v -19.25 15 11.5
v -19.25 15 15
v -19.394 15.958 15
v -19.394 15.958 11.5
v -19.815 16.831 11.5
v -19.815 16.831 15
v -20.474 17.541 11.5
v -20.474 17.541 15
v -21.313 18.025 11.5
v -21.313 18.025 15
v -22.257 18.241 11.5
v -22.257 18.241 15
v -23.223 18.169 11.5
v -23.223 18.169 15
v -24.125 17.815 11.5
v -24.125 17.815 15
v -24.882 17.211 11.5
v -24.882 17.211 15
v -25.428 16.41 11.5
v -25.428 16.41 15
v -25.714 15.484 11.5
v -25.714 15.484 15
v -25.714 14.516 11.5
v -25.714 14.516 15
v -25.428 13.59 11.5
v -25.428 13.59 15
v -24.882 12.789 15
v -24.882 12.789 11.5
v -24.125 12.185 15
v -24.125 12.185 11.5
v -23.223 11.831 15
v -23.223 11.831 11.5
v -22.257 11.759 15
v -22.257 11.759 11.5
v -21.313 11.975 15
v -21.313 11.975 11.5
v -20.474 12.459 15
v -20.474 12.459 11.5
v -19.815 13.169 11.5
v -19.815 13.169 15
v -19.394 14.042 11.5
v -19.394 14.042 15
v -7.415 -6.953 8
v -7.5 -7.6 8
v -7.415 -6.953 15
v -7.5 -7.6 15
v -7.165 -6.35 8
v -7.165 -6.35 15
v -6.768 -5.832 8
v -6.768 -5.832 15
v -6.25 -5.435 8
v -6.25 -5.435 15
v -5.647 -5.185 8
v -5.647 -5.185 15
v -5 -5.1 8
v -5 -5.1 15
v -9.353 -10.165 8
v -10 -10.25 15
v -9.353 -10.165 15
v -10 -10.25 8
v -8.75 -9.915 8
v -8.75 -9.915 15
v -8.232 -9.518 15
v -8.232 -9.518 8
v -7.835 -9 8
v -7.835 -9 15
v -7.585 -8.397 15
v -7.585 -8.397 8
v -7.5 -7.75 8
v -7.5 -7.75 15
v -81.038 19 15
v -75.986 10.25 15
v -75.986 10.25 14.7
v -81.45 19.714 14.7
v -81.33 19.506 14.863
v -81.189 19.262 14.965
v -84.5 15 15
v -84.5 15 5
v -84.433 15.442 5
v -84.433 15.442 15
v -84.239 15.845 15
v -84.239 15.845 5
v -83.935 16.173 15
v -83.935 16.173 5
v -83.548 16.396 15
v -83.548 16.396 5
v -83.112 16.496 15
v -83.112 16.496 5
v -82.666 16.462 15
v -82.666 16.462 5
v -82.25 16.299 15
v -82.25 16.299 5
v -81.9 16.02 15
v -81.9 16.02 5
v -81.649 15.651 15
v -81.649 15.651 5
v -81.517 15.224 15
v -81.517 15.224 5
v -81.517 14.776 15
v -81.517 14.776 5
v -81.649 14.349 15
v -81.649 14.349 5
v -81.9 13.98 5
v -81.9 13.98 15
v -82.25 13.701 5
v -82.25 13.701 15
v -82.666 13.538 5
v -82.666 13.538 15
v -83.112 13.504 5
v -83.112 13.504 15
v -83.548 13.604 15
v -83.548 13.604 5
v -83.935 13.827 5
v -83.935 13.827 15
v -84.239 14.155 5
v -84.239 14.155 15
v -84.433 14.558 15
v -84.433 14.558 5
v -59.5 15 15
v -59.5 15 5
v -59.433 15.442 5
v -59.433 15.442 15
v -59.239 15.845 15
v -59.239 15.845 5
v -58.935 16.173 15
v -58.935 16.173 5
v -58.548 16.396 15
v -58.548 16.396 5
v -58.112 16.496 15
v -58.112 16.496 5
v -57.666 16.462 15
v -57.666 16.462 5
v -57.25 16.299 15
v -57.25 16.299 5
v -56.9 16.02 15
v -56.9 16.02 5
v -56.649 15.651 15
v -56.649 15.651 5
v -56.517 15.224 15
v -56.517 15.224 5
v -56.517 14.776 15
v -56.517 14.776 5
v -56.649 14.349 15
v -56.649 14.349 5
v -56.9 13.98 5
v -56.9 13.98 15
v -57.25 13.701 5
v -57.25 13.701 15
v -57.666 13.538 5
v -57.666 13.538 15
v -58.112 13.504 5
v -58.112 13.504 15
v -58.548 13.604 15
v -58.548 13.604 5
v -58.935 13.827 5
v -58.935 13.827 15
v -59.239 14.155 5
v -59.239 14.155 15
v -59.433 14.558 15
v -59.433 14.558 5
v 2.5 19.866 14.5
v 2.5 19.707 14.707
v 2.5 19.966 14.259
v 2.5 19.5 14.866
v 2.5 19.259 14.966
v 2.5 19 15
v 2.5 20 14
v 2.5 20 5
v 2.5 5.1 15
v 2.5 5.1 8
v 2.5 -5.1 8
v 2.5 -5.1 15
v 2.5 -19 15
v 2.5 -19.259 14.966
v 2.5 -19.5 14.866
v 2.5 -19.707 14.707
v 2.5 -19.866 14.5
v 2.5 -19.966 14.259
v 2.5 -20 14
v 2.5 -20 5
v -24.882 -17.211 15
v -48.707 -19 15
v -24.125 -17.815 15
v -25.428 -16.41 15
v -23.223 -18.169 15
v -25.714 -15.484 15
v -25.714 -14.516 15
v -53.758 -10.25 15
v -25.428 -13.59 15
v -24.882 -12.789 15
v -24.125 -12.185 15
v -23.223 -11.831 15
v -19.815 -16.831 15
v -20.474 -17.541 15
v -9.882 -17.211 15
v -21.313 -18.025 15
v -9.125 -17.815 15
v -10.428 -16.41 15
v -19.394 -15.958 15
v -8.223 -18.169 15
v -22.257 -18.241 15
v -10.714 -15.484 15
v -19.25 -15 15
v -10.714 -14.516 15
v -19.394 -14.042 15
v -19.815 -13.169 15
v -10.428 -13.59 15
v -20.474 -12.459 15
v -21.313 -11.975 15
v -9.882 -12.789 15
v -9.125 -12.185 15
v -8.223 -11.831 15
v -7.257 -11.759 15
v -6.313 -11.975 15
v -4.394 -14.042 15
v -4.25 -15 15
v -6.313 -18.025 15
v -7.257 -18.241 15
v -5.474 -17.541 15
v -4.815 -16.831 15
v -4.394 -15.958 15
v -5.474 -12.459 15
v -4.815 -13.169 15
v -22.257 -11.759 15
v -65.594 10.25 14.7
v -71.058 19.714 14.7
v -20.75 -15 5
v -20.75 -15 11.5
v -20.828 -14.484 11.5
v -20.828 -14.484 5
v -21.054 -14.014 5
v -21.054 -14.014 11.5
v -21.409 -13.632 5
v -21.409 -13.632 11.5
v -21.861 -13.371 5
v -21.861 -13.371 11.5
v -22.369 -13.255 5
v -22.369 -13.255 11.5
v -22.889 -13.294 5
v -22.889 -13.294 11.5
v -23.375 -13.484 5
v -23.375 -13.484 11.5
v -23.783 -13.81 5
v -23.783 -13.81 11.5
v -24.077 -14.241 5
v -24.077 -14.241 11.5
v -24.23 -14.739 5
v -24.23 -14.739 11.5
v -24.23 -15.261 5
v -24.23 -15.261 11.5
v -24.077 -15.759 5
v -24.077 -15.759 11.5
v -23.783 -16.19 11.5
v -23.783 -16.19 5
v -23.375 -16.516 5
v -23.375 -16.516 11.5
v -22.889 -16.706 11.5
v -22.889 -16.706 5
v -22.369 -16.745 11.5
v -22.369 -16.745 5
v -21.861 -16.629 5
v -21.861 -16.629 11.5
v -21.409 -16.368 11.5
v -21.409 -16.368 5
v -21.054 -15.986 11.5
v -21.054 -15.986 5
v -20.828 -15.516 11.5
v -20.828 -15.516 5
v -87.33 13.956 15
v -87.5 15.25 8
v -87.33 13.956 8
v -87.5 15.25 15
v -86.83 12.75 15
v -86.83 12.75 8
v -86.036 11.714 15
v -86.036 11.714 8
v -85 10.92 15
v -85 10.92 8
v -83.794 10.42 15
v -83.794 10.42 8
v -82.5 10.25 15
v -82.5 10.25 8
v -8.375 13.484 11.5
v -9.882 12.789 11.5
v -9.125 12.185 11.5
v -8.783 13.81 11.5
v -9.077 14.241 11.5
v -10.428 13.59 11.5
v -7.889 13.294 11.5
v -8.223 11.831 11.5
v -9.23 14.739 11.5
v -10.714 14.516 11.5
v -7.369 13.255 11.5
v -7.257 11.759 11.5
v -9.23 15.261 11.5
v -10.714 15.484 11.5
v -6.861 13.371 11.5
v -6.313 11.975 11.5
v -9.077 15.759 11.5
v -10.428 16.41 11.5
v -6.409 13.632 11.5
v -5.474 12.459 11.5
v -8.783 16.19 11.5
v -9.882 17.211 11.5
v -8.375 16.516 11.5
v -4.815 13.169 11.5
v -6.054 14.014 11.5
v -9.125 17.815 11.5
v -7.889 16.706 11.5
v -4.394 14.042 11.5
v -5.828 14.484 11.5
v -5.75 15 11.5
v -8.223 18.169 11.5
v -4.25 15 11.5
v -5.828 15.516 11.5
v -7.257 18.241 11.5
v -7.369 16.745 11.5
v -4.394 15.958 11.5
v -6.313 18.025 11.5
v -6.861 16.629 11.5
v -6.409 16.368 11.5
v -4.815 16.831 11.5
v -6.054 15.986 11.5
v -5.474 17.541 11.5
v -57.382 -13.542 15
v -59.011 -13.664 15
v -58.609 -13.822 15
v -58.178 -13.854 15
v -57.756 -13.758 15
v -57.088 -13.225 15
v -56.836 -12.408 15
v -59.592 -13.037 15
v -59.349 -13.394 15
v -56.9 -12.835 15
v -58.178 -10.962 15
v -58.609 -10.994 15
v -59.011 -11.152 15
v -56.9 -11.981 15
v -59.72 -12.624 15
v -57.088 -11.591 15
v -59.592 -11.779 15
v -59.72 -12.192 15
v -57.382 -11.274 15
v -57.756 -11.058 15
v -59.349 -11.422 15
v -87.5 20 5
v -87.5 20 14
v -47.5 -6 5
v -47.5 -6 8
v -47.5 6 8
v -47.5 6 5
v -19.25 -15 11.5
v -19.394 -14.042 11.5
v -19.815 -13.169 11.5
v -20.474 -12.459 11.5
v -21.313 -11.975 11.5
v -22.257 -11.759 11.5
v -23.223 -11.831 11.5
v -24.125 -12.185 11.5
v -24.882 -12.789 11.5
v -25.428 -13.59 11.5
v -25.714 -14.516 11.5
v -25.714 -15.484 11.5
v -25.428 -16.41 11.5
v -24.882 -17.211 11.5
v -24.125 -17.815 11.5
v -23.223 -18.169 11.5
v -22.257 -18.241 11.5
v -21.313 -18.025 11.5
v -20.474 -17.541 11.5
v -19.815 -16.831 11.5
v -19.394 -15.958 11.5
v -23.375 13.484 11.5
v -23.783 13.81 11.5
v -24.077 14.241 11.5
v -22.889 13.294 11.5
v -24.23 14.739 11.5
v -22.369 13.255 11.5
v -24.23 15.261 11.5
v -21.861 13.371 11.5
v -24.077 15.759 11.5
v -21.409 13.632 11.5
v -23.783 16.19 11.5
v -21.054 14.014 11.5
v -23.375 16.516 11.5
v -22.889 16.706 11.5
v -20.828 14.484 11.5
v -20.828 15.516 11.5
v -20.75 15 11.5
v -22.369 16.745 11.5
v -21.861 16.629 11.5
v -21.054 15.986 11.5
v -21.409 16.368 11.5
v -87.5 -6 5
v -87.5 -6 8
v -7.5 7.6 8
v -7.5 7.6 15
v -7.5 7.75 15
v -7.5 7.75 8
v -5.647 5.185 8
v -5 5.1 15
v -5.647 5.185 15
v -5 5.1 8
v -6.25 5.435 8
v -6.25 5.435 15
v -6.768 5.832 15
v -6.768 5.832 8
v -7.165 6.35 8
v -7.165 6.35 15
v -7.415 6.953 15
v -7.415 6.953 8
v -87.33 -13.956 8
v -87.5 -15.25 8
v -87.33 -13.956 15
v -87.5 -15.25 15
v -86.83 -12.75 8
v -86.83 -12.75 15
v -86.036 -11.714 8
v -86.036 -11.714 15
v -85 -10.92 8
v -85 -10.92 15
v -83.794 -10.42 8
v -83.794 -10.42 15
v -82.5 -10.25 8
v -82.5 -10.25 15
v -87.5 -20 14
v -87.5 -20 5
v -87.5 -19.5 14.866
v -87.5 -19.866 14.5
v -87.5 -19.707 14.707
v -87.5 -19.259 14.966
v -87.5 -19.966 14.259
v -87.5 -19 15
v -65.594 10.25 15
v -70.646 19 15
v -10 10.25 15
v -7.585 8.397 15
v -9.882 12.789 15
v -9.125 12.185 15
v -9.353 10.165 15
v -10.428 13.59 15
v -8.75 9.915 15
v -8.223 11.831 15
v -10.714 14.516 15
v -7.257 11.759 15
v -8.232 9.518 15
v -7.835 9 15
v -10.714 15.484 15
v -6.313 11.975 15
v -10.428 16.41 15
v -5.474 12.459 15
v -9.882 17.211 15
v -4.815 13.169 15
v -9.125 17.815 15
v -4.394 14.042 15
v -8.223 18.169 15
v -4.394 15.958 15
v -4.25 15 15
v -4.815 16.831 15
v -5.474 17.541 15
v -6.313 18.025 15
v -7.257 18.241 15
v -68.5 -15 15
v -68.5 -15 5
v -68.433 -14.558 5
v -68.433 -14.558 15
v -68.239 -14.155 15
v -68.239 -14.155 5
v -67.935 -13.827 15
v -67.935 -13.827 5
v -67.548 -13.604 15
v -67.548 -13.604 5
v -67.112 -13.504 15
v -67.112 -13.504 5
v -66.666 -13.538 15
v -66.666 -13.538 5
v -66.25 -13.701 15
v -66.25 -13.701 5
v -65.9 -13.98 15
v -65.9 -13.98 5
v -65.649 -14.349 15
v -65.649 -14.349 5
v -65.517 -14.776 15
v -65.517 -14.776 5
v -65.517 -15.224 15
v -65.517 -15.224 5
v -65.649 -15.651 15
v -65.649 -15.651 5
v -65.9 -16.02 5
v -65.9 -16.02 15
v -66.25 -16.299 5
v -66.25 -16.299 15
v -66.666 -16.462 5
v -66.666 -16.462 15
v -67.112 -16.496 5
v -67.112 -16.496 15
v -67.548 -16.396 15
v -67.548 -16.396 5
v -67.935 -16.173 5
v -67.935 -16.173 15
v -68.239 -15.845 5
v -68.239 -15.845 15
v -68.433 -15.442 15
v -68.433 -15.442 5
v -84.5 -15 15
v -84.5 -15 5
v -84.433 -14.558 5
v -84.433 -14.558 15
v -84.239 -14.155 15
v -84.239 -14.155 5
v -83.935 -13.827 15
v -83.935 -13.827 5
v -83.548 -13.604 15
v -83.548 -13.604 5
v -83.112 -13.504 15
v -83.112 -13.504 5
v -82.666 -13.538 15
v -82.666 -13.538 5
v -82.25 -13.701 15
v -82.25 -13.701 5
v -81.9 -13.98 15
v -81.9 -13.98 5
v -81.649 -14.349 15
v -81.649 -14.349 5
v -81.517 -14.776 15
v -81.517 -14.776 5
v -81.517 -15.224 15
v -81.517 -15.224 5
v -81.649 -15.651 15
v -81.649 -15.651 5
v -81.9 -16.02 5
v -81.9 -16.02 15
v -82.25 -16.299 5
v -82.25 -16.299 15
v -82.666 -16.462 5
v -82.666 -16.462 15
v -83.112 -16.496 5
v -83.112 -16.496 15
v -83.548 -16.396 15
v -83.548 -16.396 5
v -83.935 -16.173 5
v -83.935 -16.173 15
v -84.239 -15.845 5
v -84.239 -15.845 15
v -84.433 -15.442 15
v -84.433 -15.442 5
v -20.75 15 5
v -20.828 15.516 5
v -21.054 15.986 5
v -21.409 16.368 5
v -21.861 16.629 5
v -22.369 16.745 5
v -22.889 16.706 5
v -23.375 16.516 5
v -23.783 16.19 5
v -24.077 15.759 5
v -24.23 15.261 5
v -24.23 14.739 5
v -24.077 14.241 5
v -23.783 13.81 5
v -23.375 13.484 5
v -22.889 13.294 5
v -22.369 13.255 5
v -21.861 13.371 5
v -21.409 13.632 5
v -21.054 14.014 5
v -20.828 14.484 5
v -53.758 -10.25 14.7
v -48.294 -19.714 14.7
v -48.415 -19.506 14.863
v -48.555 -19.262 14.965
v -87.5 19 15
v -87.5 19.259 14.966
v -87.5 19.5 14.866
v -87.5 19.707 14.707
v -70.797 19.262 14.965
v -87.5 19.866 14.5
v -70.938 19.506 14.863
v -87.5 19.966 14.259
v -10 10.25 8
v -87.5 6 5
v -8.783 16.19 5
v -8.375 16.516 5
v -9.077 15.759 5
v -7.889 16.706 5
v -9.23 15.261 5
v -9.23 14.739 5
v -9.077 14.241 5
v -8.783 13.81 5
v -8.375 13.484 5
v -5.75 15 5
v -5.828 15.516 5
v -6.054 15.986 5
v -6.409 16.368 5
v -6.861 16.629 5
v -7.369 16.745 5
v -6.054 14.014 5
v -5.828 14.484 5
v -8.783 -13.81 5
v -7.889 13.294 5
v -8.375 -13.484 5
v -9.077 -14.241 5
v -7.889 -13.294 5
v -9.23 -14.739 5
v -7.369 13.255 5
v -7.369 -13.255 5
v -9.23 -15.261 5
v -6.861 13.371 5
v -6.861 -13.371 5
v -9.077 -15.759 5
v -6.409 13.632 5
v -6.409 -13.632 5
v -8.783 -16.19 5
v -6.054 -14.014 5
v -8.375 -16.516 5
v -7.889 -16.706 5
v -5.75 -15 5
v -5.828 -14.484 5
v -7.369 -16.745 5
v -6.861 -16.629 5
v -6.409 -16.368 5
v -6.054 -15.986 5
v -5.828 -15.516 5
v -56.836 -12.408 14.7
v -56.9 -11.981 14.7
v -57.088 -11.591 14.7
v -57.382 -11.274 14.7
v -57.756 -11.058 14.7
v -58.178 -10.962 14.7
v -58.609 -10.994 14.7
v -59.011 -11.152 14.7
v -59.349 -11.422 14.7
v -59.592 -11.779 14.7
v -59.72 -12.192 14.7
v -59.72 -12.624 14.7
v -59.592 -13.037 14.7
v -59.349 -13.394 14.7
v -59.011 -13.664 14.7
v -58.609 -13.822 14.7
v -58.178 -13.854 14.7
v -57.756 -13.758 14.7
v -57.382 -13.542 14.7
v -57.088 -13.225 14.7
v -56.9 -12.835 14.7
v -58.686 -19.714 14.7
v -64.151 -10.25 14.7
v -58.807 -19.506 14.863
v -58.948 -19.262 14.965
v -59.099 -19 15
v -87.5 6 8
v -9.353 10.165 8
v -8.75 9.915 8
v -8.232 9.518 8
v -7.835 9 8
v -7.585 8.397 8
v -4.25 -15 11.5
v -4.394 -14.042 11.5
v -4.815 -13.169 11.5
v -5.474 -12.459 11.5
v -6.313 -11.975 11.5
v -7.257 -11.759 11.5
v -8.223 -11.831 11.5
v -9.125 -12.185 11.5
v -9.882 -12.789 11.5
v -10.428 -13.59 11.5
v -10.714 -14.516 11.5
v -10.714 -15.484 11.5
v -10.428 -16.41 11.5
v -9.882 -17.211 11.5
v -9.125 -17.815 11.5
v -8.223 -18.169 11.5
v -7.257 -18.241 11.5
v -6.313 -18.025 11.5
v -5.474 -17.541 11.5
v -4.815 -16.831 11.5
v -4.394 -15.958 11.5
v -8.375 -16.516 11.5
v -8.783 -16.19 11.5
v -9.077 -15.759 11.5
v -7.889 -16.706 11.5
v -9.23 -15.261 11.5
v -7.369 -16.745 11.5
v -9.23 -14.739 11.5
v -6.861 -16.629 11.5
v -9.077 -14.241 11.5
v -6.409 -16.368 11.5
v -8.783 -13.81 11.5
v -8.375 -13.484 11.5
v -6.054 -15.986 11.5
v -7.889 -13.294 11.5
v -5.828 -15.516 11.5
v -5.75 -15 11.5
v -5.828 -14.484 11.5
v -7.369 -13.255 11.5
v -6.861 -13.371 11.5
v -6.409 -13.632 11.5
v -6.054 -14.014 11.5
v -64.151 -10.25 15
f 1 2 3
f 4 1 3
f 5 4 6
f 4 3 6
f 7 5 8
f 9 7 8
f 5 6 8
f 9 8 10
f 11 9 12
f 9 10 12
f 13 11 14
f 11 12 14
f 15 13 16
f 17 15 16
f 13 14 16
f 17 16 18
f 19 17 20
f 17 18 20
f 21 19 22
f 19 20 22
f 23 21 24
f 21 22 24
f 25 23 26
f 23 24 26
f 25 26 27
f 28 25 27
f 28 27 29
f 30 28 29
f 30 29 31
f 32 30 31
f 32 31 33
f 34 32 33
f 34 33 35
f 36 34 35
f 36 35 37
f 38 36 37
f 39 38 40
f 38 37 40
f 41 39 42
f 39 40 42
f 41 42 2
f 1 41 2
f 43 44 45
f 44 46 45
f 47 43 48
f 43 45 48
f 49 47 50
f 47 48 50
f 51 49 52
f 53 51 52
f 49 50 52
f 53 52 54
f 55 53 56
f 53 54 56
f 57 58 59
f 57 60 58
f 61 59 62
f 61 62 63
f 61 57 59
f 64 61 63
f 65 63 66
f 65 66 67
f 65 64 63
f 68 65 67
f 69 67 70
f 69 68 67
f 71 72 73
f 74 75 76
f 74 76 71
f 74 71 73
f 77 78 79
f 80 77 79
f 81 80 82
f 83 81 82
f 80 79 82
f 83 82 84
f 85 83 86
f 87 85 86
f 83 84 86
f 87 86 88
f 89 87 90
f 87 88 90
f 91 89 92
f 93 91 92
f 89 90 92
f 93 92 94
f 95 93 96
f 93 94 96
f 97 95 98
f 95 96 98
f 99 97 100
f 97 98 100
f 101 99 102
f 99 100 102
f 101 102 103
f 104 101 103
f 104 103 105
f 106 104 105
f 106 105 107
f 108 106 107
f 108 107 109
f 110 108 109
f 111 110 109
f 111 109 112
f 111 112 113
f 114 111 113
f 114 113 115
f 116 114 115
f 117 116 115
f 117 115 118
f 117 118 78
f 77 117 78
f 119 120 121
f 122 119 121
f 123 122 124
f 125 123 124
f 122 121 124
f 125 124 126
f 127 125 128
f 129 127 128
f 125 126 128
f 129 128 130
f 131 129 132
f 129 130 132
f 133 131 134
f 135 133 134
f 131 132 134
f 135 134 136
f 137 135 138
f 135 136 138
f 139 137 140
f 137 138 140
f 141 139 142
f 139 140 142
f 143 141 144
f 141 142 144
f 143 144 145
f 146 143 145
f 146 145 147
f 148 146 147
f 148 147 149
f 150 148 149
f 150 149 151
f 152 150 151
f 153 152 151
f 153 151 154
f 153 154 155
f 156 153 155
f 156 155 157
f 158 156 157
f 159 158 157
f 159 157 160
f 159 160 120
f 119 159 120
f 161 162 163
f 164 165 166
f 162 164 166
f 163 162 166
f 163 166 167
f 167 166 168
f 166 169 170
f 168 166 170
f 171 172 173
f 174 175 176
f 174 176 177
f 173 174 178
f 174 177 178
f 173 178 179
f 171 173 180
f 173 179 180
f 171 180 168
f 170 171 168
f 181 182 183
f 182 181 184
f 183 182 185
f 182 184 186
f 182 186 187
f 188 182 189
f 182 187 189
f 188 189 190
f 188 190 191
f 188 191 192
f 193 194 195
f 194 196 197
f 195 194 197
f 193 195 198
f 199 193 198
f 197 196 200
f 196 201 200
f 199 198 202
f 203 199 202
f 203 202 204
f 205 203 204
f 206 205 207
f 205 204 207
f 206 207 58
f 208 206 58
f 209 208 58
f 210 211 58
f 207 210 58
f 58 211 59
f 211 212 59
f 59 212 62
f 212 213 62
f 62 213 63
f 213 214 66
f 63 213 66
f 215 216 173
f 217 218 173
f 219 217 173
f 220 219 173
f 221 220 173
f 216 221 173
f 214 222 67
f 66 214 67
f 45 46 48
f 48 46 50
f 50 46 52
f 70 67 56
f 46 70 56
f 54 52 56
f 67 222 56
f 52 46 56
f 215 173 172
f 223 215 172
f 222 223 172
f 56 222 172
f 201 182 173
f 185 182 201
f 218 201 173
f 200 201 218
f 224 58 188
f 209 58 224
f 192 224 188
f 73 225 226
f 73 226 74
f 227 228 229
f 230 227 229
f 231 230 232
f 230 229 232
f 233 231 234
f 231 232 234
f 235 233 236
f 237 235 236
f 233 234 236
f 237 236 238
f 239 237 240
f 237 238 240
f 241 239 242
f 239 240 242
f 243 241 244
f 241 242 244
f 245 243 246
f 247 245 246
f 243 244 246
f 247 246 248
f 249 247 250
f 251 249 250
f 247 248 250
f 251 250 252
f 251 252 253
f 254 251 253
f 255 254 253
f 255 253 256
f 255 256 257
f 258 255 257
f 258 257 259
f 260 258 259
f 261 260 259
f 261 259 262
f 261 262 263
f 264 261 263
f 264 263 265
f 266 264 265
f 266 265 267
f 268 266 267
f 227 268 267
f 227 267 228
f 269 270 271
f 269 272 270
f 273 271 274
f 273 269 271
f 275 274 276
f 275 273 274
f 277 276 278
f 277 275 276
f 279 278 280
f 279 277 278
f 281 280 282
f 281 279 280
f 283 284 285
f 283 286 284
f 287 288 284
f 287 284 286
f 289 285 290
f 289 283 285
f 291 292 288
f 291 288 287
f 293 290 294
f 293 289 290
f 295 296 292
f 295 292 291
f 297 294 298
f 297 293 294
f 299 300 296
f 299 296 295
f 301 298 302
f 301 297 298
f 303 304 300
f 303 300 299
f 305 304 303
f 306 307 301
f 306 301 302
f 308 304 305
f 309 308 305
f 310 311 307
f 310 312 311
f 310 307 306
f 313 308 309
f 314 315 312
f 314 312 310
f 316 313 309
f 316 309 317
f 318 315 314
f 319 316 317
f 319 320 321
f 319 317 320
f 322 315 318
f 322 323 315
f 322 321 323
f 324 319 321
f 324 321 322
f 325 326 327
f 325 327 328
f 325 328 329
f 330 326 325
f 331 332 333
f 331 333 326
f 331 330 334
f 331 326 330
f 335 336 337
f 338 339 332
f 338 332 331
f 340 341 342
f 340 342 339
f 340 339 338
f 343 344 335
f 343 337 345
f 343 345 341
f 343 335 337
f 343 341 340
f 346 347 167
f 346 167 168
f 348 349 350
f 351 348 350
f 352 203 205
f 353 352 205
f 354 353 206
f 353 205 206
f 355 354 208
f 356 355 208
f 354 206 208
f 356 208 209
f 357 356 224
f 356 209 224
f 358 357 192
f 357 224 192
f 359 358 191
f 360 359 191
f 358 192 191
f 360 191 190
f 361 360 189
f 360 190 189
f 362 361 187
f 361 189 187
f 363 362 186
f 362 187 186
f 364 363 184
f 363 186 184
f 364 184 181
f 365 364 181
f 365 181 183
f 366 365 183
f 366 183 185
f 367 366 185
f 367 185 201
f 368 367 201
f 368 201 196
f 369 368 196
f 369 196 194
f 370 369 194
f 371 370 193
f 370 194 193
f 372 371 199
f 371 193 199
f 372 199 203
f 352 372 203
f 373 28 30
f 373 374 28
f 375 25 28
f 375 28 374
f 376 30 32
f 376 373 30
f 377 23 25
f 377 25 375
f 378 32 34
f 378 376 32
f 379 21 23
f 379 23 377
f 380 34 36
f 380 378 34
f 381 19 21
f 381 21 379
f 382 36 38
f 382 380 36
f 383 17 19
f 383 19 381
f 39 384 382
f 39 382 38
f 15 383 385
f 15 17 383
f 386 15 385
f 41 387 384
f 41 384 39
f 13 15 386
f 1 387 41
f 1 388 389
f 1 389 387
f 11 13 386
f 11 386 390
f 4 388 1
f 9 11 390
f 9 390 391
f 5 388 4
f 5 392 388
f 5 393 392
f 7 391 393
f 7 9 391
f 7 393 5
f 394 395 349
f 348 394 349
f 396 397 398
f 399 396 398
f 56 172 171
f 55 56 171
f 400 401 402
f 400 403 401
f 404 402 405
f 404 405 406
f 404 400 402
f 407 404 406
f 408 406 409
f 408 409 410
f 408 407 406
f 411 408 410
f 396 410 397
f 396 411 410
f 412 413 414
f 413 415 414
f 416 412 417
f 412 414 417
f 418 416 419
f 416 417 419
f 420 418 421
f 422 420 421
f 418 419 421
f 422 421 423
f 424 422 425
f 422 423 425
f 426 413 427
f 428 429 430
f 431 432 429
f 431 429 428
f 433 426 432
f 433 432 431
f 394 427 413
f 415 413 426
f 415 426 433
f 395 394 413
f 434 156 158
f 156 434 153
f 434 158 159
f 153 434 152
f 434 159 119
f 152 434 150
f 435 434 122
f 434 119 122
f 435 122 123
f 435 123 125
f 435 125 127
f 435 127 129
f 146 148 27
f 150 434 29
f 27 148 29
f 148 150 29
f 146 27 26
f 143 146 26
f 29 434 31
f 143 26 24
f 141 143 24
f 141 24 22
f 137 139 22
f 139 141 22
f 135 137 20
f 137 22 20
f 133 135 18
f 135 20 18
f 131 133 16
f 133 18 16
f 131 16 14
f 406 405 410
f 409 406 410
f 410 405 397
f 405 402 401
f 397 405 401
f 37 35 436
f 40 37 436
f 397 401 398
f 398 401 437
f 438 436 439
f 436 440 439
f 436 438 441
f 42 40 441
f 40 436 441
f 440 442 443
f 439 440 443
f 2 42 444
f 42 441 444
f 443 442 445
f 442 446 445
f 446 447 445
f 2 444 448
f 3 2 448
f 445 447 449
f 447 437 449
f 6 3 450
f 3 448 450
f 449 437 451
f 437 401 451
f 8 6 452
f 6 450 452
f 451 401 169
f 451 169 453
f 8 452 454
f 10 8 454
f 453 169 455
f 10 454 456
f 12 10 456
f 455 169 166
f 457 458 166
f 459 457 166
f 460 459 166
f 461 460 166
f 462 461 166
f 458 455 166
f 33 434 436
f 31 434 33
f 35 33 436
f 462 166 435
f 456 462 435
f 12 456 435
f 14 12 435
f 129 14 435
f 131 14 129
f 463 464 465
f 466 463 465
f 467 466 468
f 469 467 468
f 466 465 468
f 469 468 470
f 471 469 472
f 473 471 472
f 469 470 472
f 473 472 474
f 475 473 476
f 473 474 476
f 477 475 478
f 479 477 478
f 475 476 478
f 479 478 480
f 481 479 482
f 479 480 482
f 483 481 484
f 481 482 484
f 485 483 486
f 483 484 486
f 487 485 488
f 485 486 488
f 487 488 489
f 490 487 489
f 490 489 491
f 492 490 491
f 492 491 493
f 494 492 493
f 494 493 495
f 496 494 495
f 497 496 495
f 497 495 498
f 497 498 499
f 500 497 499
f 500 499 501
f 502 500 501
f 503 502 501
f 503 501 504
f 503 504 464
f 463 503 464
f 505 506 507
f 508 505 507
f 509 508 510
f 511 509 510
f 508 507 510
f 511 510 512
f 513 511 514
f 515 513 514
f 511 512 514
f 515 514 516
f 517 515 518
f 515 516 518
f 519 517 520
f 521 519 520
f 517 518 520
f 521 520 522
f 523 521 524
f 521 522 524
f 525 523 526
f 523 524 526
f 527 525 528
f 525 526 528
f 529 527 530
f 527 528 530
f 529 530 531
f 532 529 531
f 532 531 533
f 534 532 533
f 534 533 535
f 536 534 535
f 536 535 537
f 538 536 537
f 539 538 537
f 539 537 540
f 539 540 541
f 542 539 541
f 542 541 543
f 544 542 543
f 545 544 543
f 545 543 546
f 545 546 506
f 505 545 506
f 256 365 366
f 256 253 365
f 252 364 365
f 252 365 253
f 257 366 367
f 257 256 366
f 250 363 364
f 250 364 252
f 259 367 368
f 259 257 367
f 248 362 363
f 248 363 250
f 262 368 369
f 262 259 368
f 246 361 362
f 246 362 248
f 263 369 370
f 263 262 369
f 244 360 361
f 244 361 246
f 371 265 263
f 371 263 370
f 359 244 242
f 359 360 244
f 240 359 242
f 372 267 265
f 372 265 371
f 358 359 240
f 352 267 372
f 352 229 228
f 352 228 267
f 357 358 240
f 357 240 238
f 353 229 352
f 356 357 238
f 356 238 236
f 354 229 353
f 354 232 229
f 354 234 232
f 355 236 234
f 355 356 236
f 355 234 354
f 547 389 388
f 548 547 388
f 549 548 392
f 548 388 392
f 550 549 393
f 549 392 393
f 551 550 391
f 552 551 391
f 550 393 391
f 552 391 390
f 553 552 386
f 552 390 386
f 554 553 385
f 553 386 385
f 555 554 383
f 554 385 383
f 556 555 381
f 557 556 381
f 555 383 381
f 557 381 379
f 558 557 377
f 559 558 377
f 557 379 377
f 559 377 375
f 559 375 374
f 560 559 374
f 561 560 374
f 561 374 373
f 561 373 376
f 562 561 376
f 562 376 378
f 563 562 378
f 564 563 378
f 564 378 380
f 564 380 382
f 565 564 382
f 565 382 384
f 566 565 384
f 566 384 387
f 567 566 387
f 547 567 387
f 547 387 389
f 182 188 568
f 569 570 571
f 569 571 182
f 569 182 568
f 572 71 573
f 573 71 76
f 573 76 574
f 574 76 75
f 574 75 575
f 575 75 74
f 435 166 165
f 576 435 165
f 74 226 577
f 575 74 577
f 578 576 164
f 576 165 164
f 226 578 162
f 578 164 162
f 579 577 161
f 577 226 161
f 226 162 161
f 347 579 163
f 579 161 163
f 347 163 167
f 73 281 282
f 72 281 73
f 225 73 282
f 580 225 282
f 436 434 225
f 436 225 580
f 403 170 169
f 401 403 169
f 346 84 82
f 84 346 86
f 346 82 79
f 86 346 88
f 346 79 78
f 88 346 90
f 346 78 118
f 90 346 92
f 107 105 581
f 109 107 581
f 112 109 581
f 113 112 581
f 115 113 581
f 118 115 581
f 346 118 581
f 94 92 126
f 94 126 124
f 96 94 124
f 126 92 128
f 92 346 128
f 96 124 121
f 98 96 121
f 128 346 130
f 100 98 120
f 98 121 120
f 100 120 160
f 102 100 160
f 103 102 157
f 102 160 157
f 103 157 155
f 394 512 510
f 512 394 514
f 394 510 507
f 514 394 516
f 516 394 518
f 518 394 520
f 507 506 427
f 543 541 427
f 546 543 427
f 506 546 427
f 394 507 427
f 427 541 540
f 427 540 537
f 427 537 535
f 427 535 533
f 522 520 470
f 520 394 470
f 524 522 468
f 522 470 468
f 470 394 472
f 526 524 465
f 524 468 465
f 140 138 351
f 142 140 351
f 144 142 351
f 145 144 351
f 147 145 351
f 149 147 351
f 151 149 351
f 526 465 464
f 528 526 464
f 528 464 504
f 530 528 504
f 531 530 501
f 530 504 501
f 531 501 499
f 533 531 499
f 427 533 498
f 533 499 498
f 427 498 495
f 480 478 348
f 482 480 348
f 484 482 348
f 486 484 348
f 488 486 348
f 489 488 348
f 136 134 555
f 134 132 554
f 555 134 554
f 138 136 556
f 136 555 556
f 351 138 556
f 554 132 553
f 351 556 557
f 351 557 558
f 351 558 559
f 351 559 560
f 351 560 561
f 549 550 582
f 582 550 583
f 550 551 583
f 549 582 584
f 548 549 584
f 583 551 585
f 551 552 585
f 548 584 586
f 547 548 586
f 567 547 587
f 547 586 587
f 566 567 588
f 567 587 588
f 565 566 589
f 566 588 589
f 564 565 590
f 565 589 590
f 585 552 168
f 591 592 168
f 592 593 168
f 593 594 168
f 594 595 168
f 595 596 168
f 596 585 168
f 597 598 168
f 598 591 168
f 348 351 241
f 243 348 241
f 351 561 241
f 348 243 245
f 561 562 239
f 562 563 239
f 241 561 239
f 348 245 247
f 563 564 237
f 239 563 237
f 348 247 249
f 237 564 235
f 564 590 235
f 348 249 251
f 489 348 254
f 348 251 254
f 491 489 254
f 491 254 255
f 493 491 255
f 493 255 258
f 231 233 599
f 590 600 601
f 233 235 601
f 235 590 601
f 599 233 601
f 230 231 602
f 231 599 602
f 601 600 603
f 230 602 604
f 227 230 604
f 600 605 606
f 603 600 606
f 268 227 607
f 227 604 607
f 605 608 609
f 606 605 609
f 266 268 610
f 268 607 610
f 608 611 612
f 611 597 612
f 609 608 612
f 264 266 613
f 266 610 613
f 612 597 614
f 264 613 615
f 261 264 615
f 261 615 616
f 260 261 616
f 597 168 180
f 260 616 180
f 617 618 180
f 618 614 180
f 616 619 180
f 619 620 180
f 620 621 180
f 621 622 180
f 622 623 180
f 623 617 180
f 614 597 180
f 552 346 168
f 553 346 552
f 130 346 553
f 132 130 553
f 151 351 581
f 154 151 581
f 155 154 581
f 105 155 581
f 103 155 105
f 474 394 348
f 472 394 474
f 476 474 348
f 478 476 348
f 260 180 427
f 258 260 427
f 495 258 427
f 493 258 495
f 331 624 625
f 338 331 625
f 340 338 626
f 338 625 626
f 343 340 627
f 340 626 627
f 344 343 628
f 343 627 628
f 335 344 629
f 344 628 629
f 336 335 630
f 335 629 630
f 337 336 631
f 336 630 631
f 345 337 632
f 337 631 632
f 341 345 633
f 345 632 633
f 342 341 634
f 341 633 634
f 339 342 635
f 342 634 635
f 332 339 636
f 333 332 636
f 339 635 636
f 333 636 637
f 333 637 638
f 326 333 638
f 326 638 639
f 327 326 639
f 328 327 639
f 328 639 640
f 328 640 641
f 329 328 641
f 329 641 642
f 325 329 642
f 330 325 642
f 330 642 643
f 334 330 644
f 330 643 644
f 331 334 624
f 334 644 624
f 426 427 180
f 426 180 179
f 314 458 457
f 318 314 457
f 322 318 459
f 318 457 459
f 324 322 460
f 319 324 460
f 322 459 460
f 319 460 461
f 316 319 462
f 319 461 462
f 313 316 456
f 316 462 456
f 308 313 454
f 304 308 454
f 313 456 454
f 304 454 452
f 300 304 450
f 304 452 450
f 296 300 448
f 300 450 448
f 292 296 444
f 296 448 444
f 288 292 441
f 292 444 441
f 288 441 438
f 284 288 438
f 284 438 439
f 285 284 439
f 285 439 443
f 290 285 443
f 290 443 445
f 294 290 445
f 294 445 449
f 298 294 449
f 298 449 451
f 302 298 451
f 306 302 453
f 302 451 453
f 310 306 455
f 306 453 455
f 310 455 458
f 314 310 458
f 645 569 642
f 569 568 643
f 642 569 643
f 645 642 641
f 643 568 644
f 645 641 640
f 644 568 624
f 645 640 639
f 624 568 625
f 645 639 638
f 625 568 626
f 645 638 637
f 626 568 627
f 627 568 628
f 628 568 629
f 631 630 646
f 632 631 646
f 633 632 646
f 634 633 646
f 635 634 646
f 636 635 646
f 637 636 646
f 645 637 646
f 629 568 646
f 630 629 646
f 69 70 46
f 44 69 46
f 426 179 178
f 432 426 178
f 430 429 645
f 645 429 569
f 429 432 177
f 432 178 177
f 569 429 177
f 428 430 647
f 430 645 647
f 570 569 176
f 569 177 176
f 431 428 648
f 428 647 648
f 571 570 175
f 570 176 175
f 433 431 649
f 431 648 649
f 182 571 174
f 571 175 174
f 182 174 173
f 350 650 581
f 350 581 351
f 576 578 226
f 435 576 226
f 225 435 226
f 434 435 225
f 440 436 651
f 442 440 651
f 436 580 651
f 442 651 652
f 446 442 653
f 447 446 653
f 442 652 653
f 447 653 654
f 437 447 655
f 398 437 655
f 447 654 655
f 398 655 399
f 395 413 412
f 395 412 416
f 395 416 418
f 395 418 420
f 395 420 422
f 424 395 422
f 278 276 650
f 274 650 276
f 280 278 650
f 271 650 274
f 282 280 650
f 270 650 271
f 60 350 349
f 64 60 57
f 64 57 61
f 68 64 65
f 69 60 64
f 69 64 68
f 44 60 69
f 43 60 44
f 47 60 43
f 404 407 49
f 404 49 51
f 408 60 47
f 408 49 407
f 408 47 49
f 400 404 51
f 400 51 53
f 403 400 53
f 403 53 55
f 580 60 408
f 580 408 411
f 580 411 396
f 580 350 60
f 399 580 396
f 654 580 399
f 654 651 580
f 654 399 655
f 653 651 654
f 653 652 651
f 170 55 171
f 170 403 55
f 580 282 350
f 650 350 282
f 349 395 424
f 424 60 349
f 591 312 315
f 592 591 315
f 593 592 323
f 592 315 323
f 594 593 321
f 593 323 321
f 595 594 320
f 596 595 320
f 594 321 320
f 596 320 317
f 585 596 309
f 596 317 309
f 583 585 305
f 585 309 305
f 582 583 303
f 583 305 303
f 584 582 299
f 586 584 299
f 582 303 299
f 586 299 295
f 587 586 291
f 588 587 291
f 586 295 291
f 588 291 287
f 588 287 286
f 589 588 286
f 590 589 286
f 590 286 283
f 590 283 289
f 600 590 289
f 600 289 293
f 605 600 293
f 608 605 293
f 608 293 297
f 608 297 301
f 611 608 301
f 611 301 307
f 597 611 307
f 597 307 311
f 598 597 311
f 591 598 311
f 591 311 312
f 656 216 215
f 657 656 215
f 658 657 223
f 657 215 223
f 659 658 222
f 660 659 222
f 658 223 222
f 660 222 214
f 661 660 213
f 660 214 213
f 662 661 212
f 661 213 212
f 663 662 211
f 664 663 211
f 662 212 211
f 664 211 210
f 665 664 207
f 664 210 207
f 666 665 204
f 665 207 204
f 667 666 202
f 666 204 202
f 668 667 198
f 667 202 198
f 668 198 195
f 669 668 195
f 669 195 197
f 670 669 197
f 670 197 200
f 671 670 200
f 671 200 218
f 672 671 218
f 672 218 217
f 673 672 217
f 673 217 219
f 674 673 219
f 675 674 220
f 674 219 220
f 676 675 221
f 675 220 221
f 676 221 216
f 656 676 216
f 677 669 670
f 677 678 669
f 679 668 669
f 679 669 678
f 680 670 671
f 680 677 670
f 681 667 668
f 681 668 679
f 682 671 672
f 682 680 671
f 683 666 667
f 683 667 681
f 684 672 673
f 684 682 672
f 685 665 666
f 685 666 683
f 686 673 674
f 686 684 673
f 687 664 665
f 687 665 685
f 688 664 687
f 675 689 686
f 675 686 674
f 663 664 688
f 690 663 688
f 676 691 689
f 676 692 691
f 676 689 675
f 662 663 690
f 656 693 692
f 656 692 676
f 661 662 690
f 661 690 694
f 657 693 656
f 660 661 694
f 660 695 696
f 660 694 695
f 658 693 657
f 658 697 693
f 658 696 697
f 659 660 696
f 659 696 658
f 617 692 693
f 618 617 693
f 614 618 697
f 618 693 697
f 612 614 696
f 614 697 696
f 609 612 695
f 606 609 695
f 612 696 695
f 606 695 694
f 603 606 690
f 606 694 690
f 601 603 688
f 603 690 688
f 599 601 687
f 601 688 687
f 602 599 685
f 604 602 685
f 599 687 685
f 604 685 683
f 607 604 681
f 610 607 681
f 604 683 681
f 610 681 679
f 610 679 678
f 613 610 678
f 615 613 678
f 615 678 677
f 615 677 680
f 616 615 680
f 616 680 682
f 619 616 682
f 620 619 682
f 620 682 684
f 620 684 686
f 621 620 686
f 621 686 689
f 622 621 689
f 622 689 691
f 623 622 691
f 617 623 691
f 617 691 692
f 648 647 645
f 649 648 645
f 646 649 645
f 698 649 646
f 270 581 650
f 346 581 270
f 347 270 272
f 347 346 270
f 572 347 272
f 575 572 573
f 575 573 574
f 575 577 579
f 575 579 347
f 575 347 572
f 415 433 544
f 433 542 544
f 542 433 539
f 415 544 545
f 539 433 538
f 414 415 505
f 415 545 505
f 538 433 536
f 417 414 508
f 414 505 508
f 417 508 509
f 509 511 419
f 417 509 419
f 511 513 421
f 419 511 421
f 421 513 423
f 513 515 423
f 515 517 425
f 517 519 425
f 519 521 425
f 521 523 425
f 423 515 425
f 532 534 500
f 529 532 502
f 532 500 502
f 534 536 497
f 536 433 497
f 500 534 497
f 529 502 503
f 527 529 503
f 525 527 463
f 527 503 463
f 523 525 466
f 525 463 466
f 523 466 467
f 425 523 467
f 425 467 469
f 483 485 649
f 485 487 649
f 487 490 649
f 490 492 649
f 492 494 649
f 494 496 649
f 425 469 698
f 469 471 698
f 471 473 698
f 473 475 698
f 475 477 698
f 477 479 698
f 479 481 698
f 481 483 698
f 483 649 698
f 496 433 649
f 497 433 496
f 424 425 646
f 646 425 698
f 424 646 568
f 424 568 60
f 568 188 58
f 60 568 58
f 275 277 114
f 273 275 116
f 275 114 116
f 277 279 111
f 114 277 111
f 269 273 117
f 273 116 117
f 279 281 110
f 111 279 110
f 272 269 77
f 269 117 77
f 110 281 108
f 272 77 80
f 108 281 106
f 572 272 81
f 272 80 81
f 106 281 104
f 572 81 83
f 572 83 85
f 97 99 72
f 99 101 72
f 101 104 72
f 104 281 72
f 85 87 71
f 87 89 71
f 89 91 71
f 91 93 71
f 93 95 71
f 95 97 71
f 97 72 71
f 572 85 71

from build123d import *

# Parameters (mm, degrees)
SKETCH_1_W           = 255
SKETCH_1_H           = 80
EXTRUDE_1_DEPTH      = 5
SKETCH_2_R           = 5
CUT_EXTRUDE_1_DEPTH  = 5
SKETCH_3_R           = 4
CUT_EXTRUDE_2_DEPTH  = 10
SKETCH_4_W           = 50
SKETCH_4_H           = 20
EXTRUDE_2_DEPTH      = 10
SKETCH_5_R           = 15
CUT_EXTRUDE_3_DEPTH  = 10
SKETCH_6_R           = 7
EXTRUDE_3_DEPTH      = 15
HOLE_WIZARD_M6_1_D   = 5
CUT_EXTRUDE_4_DEPTH  = 7
HOLE_WIZARD_M4_1_D   = 3.3
FILLET_1_R           = 10
SKETCH_13_R          = 6.969385005
EXTRUDE_5_DEPTH      = 5
SKETCH_14_W          = 5
SKETCH_14_H          = 75
EXTRUDE_6_DEPTH      = 80
SKETCH_15_W          = 20
SKETCH_15_H          = 5
EXTRUDE_7_DEPTH      = 80
EXTRUDE_8_DEPTH      = 5
SKETCH_17_R          = 3
CUT_EXTRUDE_5_DEPTH  = 5
FILLET_2_R           = 1
SKETCH_18_W          = 309.613912266
SKETCH_18_H          = 134.290371586
CUT_EXTRUDE_6_DEPTH  = 81
SKETCH_19_R          = 17
CUT_EXTRUDE_7_DEPTH  = 11
SKETCH_20_W          = 10
SKETCH_20_H          = 10
EXTRUDE_9_DEPTH      = 50
SKETCH_21_R          = 1.75
CUT_EXTRUDE_8_DEPTH  = 11
SKETCH_22_R          = 3.25
CUT_EXTRUDE_9_DEPTH  = 3.5
FILLET_4_R           = 1
EXTRUDE_10_DEPTH     = 40
SKETCH_24_W          = 160
SKETCH_24_H          = 20.5
CUT_EXTRUDE_10_DEPTH = 7
SKETCH_25_W          = 80
SKETCH_25_H          = 12
CUT_EXTRUDE_11_DEPTH = 4
FILLET_5_R           = 5
CUT_EXTRUDE_12_DEPTH = 0.3
SKETCH_27_R          = 1.45
EXTRUDE_11_DEPTH     = 0.3
F_3_0MM_1_D          = 3
FILLET_6_R           = 2.5


with BuildPart() as part:
    # 草图1 → 凸台-拉伸1 (new body)
    with BuildSketch(Plane.XY):
        Rectangle(SKETCH_1_W, SKETCH_1_H)
    extrude(amount=EXTRUDE_1_DEPTH)

    # 草图2 → 切除-拉伸1 (cut)
    with BuildSketch(Plane.XY.offset(5)):
        with Locations((-107.5, 0)):
            Circle(SKETCH_2_R)
    extrude(amount=-CUT_EXTRUDE_1_DEPTH, mode=Mode.SUBTRACT)

    # 草图3 → 切除-拉伸2 (cut)
    with BuildSketch(Plane.XY.offset(5)):
        with Locations((-45, 0)):
            Circle(SKETCH_3_R)
    extrude(amount=-CUT_EXTRUDE_2_DEPTH, mode=Mode.SUBTRACT)

    # 草图4 → 凸台-拉伸2 (add)
    with BuildSketch(Plane.XY.offset(5)):
        with Locations((-22.5, 0)):
            Rectangle(SKETCH_4_W, SKETCH_4_H)
    extrude(amount=EXTRUDE_2_DEPTH)

    # 草图5 → 切除-拉伸3 (cut)
    with BuildSketch(Plane.XY.offset(5)):
        with Locations((70, 0)):
            Circle(SKETCH_5_R)
    extrude(amount=-CUT_EXTRUDE_3_DEPTH, mode=Mode.SUBTRACT)

    # 草图6 → 凸台-拉伸3 (add)
    with BuildSketch(Plane(origin=(0, 0, 0), x_dir=(-1, 0, 0), z_dir=(0, 0, -1))):
        with Locations((107.5, 0)):
            Circle(SKETCH_6_R)
    extrude(amount=-EXTRUDE_3_DEPTH)

    # M6 螺纹孔1 (through all)
    with Locations(Plane.XY.offset(15)):
        with Locations((-107.5, 0)):
            Hole(HOLE_WIZARD_M6_1_D / 2)

    # 草图10 → 切除-拉伸4 (cut)
    with BuildSketch(Plane.XY.offset(15)):
        with BuildLine():
            Line((-47.5, 5.1), (2.5, 5.1))
            ThreePointArc((2.5, 5.1), (7.6, 0), (2.5, -5.1))
            Line((2.5, -5.1), (-47.5, -5.1))
            ThreePointArc((-47.5, -5.1), (-52.6, 0), (-47.5, 5.1))
        make_face()
    extrude(amount=-CUT_EXTRUDE_4_DEPTH, mode=Mode.SUBTRACT)

    # M4 螺纹孔1 (through all)
    with Locations(Plane(origin=(0, 0, 0), x_dir=(-1, 0, 0), z_dir=(0, 0, -1))):
        with Locations((-39.75, -26.5), (-39.75, -1.5), (-109.94007449, -26.5), (-100.25, -1.5)):
            Hole(HOLE_WIZARD_M4_1_D / 2)

    # 圆角1
    fillet_1_edges = [part.edges().sort_by_distance(p)[0] for p in [
        (-127.5, 40, 2.5),
        (-127.5, -40, 2.5),
    ]]
    fillet(fillet_1_edges, radius=FILLET_1_R)

    # 草图13 → 凸台-拉伸5 (add)
    with BuildSketch(Plane.XY.offset(5)):
        with Locations((-45, 0)):
            Circle(SKETCH_13_R)
    extrude(amount=-EXTRUDE_5_DEPTH)

    # 草图14 → 凸台-拉伸6 (add)
    with BuildSketch(Plane.XZ.offset(40)):
        with Locations((125, -37.5)):
            Rectangle(SKETCH_14_W, SKETCH_14_H)
    extrude(amount=-EXTRUDE_6_DEPTH)

    # 草图15 → 凸台-拉伸7 (add)
    with BuildSketch(Plane.XZ.offset(40)):
        with Locations((112.5, -72.5)):
            Rectangle(SKETCH_15_W, SKETCH_15_H)
    extrude(amount=-EXTRUDE_7_DEPTH)

    # 草图16 → 凸台-拉伸8 (add)
    with BuildSketch(Plane.XZ.offset(40)):
        Polygon((-32.5, 5), (-32.5, 0), (102.5, -75), (127.5, -75), (127.5, 5), align=None)
    extrude_8 = extrude(amount=-EXTRUDE_8_DEPTH)

    # 镜向1: 凸台-拉伸8 across plane
    add(extrude_8.mirror(Plane.ZX))

    # 草图17 → 切除-拉伸5 (cut)
    with BuildSketch(Plane(origin=(0, 0, -75), x_dir=(-1, 0, 0), z_dir=(0, 0, -1))):
        with Locations((-114.5, -15)):
            Circle(SKETCH_17_R)
        with Locations((-114.5, 15)):
            Circle(SKETCH_17_R)
    extrude(amount=-CUT_EXTRUDE_5_DEPTH, mode=Mode.SUBTRACT)

    # 圆角2
    fillet_2_edges = [part.edges().sort_by_distance(p)[0] for p in [
        (-75, -40, 0),
        (5, -40, 5),
        (-127.5, 0, 0),
        (-124.571067812, 37.071067812, 0),
        (-124.571067812, -37.071067812, 0),
        (-127.5, 0, 5),
        (-124.571067812, 37.071067812, 5),
        (-124.571067812, -37.071067812, 5),
        (127.5, 0, 5),
        (127.5, 0, -75),
        (115, -40, -75),
        (115, 40, -75),
        (35, -40, -37.5),
        (35, -35, -37.5),
        (5, 40, 5),
        (-75, 40, 0),
        (35, 40, -37.5),
        (35, 35, -37.5),
        (127.5, 40, -35),
        (127.5, -40, -35),
    ]]
    fillet(fillet_2_edges, radius=FILLET_2_R)

    # 草图18 → 切除-拉伸6 (cut, through all)
    with BuildSketch(Plane.XY.offset(5)):
        Rectangle(SKETCH_18_W, SKETCH_18_H)
    extrude(amount=-CUT_EXTRUDE_6_DEPTH, mode=Mode.SUBTRACT)

    # 草图19 → 切除-拉伸7 (cut, through all)
    with BuildSketch(Plane.XY.offset(15)):
        with Locations((-107.5, 0)):
            Circle(SKETCH_19_R)
    extrude(amount=-CUT_EXTRUDE_7_DEPTH, mode=Mode.SUBTRACT)

    # 草图20 → 凸台-拉伸9 (add)
    with BuildSketch(Plane(origin=(2.5, 0, 0), x_dir=(0, 0, -1), z_dir=(1, 0, 0))):
        with Locations((-10, 15)):
            Rectangle(SKETCH_20_W, SKETCH_20_H)
    extrude_9 = extrude(amount=-EXTRUDE_9_DEPTH)

    # 镜向2: 凸台-拉伸9 across plane
    add(extrude_9.mirror(Plane.ZX))

    # 草图21 → 切除-拉伸8 (cut, through all)
    with BuildSketch(Plane.XY.offset(15)):
        with Locations((-22.5, 15)):
            Circle(SKETCH_21_R)
        with Locations((-7.5, 15)):
            Circle(SKETCH_21_R)
        with Locations((-7.5, -15)):
            Circle(SKETCH_21_R)
        with Locations((-22.5, -15)):
            Circle(SKETCH_21_R)
    extrude(amount=-CUT_EXTRUDE_8_DEPTH, mode=Mode.SUBTRACT)

    # 草图22 → 切除-拉伸9 (cut)
    with BuildSketch(Plane.XY.offset(15)):
        with Locations((-22.5, 15)):
            Circle(SKETCH_22_R)
        with Locations((-7.5, 15)):
            Circle(SKETCH_22_R)
        with Locations((-7.5, -15)):
            Circle(SKETCH_22_R)
        with Locations((-22.5, -15)):
            Circle(SKETCH_22_R)
    extrude(amount=-CUT_EXTRUDE_9_DEPTH, mode=Mode.SUBTRACT)

    # 圆角4
    fillet_4_edges = [part.edges().sort_by_distance(p)[0] for p in [
        (-22.5, 20, 15),
        (-22.5, -20, 15),
    ]]
    fillet(fillet_4_edges, radius=FILLET_4_R)

    # 草图23 → 凸台-拉伸10 (add)
    with BuildSketch(Plane.ZY.offset(47.5)):
        with BuildLine():
            Line((5, -20), (14, -20))
            ThreePointArc((14, -20), (14.707106781, -19.707106781), (15, -19))
            Line((15, -19), (15, -5.1))
            Line((15, -5.1), (8, -5.1))
            Line((8, -5.1), (8, 5.1))
            Line((8, 5.1), (15, 5.1))
            Line((15, 5.1), (15, 19))
            ThreePointArc((15, 19), (14.707106781, 19.707106781), (14, 20))
            Line((14, 20), (5, 20))
            Line((5, 20), (5, -20))
        make_face()
    extrude(amount=EXTRUDE_10_DEPTH)

    # 草图24 → 切除-拉伸10 (cut)
    with BuildSketch(Plane.XY.offset(15)):
        with Locations((-87.5, 0)):
            Rectangle(SKETCH_24_W, SKETCH_24_H)
    extrude(amount=-CUT_EXTRUDE_10_DEPTH, mode=Mode.SUBTRACT)

    # 草图25 → 切除-拉伸11 (cut, through all)
    with BuildSketch(Plane.XY.offset(8)):
        with Locations((-87.5, 0)):
            Rectangle(SKETCH_25_W, SKETCH_25_H)
    extrude(amount=-CUT_EXTRUDE_11_DEPTH, mode=Mode.SUBTRACT)

    # 圆角5
    fillet_5_edges = [part.edges().sort_by_distance(p)[0] for p in [
        (-87.5, 10.25, 11.5),
        (-87.5, -10.25, 11.5),
    ]]
    fillet(fillet_5_edges, radius=FILLET_5_R)

    # 草图26 → 切除-拉伸12 (cut)
    with BuildSketch(Plane.XY.offset(15)):
        Polygon((-58.521459286, -20), (-81.615470054, 20), (-71.223165208, 20), (-48.129154441, -20), align=None)
    extrude(amount=-CUT_EXTRUDE_12_DEPTH, mode=Mode.SUBTRACT)

    # 草图27 → 凸台-拉伸11 (add)
    with BuildSketch(Plane.XY.offset(14.7)):
        with Locations((-58.285898385, -12.408003449)):
            Circle(SKETCH_27_R)
    extrude(amount=EXTRUDE_11_DEPTH)

    # Ø3.0mm 暗销孔1 (through all)
    with Locations(Plane.XY.offset(15)):
        with Locations((-83, 15), (-58, 15), (-67, -15), (-83, -15)):
            Hole(F_3_0MM_1_D / 2)

    # 圆角6
    fillet_6_edges = [part.edges().sort_by_distance(p)[0] for p in [
        (-7.5, -5.1, 11.5),
        (-7.5, 5.1, 11.5),
        (-7.5, 10.25, 11.5),
        (-7.5, -10.25, 11.5),
    ]]
    fillet(fillet_6_edges, radius=FILLET_6_R)


solid = part.part
